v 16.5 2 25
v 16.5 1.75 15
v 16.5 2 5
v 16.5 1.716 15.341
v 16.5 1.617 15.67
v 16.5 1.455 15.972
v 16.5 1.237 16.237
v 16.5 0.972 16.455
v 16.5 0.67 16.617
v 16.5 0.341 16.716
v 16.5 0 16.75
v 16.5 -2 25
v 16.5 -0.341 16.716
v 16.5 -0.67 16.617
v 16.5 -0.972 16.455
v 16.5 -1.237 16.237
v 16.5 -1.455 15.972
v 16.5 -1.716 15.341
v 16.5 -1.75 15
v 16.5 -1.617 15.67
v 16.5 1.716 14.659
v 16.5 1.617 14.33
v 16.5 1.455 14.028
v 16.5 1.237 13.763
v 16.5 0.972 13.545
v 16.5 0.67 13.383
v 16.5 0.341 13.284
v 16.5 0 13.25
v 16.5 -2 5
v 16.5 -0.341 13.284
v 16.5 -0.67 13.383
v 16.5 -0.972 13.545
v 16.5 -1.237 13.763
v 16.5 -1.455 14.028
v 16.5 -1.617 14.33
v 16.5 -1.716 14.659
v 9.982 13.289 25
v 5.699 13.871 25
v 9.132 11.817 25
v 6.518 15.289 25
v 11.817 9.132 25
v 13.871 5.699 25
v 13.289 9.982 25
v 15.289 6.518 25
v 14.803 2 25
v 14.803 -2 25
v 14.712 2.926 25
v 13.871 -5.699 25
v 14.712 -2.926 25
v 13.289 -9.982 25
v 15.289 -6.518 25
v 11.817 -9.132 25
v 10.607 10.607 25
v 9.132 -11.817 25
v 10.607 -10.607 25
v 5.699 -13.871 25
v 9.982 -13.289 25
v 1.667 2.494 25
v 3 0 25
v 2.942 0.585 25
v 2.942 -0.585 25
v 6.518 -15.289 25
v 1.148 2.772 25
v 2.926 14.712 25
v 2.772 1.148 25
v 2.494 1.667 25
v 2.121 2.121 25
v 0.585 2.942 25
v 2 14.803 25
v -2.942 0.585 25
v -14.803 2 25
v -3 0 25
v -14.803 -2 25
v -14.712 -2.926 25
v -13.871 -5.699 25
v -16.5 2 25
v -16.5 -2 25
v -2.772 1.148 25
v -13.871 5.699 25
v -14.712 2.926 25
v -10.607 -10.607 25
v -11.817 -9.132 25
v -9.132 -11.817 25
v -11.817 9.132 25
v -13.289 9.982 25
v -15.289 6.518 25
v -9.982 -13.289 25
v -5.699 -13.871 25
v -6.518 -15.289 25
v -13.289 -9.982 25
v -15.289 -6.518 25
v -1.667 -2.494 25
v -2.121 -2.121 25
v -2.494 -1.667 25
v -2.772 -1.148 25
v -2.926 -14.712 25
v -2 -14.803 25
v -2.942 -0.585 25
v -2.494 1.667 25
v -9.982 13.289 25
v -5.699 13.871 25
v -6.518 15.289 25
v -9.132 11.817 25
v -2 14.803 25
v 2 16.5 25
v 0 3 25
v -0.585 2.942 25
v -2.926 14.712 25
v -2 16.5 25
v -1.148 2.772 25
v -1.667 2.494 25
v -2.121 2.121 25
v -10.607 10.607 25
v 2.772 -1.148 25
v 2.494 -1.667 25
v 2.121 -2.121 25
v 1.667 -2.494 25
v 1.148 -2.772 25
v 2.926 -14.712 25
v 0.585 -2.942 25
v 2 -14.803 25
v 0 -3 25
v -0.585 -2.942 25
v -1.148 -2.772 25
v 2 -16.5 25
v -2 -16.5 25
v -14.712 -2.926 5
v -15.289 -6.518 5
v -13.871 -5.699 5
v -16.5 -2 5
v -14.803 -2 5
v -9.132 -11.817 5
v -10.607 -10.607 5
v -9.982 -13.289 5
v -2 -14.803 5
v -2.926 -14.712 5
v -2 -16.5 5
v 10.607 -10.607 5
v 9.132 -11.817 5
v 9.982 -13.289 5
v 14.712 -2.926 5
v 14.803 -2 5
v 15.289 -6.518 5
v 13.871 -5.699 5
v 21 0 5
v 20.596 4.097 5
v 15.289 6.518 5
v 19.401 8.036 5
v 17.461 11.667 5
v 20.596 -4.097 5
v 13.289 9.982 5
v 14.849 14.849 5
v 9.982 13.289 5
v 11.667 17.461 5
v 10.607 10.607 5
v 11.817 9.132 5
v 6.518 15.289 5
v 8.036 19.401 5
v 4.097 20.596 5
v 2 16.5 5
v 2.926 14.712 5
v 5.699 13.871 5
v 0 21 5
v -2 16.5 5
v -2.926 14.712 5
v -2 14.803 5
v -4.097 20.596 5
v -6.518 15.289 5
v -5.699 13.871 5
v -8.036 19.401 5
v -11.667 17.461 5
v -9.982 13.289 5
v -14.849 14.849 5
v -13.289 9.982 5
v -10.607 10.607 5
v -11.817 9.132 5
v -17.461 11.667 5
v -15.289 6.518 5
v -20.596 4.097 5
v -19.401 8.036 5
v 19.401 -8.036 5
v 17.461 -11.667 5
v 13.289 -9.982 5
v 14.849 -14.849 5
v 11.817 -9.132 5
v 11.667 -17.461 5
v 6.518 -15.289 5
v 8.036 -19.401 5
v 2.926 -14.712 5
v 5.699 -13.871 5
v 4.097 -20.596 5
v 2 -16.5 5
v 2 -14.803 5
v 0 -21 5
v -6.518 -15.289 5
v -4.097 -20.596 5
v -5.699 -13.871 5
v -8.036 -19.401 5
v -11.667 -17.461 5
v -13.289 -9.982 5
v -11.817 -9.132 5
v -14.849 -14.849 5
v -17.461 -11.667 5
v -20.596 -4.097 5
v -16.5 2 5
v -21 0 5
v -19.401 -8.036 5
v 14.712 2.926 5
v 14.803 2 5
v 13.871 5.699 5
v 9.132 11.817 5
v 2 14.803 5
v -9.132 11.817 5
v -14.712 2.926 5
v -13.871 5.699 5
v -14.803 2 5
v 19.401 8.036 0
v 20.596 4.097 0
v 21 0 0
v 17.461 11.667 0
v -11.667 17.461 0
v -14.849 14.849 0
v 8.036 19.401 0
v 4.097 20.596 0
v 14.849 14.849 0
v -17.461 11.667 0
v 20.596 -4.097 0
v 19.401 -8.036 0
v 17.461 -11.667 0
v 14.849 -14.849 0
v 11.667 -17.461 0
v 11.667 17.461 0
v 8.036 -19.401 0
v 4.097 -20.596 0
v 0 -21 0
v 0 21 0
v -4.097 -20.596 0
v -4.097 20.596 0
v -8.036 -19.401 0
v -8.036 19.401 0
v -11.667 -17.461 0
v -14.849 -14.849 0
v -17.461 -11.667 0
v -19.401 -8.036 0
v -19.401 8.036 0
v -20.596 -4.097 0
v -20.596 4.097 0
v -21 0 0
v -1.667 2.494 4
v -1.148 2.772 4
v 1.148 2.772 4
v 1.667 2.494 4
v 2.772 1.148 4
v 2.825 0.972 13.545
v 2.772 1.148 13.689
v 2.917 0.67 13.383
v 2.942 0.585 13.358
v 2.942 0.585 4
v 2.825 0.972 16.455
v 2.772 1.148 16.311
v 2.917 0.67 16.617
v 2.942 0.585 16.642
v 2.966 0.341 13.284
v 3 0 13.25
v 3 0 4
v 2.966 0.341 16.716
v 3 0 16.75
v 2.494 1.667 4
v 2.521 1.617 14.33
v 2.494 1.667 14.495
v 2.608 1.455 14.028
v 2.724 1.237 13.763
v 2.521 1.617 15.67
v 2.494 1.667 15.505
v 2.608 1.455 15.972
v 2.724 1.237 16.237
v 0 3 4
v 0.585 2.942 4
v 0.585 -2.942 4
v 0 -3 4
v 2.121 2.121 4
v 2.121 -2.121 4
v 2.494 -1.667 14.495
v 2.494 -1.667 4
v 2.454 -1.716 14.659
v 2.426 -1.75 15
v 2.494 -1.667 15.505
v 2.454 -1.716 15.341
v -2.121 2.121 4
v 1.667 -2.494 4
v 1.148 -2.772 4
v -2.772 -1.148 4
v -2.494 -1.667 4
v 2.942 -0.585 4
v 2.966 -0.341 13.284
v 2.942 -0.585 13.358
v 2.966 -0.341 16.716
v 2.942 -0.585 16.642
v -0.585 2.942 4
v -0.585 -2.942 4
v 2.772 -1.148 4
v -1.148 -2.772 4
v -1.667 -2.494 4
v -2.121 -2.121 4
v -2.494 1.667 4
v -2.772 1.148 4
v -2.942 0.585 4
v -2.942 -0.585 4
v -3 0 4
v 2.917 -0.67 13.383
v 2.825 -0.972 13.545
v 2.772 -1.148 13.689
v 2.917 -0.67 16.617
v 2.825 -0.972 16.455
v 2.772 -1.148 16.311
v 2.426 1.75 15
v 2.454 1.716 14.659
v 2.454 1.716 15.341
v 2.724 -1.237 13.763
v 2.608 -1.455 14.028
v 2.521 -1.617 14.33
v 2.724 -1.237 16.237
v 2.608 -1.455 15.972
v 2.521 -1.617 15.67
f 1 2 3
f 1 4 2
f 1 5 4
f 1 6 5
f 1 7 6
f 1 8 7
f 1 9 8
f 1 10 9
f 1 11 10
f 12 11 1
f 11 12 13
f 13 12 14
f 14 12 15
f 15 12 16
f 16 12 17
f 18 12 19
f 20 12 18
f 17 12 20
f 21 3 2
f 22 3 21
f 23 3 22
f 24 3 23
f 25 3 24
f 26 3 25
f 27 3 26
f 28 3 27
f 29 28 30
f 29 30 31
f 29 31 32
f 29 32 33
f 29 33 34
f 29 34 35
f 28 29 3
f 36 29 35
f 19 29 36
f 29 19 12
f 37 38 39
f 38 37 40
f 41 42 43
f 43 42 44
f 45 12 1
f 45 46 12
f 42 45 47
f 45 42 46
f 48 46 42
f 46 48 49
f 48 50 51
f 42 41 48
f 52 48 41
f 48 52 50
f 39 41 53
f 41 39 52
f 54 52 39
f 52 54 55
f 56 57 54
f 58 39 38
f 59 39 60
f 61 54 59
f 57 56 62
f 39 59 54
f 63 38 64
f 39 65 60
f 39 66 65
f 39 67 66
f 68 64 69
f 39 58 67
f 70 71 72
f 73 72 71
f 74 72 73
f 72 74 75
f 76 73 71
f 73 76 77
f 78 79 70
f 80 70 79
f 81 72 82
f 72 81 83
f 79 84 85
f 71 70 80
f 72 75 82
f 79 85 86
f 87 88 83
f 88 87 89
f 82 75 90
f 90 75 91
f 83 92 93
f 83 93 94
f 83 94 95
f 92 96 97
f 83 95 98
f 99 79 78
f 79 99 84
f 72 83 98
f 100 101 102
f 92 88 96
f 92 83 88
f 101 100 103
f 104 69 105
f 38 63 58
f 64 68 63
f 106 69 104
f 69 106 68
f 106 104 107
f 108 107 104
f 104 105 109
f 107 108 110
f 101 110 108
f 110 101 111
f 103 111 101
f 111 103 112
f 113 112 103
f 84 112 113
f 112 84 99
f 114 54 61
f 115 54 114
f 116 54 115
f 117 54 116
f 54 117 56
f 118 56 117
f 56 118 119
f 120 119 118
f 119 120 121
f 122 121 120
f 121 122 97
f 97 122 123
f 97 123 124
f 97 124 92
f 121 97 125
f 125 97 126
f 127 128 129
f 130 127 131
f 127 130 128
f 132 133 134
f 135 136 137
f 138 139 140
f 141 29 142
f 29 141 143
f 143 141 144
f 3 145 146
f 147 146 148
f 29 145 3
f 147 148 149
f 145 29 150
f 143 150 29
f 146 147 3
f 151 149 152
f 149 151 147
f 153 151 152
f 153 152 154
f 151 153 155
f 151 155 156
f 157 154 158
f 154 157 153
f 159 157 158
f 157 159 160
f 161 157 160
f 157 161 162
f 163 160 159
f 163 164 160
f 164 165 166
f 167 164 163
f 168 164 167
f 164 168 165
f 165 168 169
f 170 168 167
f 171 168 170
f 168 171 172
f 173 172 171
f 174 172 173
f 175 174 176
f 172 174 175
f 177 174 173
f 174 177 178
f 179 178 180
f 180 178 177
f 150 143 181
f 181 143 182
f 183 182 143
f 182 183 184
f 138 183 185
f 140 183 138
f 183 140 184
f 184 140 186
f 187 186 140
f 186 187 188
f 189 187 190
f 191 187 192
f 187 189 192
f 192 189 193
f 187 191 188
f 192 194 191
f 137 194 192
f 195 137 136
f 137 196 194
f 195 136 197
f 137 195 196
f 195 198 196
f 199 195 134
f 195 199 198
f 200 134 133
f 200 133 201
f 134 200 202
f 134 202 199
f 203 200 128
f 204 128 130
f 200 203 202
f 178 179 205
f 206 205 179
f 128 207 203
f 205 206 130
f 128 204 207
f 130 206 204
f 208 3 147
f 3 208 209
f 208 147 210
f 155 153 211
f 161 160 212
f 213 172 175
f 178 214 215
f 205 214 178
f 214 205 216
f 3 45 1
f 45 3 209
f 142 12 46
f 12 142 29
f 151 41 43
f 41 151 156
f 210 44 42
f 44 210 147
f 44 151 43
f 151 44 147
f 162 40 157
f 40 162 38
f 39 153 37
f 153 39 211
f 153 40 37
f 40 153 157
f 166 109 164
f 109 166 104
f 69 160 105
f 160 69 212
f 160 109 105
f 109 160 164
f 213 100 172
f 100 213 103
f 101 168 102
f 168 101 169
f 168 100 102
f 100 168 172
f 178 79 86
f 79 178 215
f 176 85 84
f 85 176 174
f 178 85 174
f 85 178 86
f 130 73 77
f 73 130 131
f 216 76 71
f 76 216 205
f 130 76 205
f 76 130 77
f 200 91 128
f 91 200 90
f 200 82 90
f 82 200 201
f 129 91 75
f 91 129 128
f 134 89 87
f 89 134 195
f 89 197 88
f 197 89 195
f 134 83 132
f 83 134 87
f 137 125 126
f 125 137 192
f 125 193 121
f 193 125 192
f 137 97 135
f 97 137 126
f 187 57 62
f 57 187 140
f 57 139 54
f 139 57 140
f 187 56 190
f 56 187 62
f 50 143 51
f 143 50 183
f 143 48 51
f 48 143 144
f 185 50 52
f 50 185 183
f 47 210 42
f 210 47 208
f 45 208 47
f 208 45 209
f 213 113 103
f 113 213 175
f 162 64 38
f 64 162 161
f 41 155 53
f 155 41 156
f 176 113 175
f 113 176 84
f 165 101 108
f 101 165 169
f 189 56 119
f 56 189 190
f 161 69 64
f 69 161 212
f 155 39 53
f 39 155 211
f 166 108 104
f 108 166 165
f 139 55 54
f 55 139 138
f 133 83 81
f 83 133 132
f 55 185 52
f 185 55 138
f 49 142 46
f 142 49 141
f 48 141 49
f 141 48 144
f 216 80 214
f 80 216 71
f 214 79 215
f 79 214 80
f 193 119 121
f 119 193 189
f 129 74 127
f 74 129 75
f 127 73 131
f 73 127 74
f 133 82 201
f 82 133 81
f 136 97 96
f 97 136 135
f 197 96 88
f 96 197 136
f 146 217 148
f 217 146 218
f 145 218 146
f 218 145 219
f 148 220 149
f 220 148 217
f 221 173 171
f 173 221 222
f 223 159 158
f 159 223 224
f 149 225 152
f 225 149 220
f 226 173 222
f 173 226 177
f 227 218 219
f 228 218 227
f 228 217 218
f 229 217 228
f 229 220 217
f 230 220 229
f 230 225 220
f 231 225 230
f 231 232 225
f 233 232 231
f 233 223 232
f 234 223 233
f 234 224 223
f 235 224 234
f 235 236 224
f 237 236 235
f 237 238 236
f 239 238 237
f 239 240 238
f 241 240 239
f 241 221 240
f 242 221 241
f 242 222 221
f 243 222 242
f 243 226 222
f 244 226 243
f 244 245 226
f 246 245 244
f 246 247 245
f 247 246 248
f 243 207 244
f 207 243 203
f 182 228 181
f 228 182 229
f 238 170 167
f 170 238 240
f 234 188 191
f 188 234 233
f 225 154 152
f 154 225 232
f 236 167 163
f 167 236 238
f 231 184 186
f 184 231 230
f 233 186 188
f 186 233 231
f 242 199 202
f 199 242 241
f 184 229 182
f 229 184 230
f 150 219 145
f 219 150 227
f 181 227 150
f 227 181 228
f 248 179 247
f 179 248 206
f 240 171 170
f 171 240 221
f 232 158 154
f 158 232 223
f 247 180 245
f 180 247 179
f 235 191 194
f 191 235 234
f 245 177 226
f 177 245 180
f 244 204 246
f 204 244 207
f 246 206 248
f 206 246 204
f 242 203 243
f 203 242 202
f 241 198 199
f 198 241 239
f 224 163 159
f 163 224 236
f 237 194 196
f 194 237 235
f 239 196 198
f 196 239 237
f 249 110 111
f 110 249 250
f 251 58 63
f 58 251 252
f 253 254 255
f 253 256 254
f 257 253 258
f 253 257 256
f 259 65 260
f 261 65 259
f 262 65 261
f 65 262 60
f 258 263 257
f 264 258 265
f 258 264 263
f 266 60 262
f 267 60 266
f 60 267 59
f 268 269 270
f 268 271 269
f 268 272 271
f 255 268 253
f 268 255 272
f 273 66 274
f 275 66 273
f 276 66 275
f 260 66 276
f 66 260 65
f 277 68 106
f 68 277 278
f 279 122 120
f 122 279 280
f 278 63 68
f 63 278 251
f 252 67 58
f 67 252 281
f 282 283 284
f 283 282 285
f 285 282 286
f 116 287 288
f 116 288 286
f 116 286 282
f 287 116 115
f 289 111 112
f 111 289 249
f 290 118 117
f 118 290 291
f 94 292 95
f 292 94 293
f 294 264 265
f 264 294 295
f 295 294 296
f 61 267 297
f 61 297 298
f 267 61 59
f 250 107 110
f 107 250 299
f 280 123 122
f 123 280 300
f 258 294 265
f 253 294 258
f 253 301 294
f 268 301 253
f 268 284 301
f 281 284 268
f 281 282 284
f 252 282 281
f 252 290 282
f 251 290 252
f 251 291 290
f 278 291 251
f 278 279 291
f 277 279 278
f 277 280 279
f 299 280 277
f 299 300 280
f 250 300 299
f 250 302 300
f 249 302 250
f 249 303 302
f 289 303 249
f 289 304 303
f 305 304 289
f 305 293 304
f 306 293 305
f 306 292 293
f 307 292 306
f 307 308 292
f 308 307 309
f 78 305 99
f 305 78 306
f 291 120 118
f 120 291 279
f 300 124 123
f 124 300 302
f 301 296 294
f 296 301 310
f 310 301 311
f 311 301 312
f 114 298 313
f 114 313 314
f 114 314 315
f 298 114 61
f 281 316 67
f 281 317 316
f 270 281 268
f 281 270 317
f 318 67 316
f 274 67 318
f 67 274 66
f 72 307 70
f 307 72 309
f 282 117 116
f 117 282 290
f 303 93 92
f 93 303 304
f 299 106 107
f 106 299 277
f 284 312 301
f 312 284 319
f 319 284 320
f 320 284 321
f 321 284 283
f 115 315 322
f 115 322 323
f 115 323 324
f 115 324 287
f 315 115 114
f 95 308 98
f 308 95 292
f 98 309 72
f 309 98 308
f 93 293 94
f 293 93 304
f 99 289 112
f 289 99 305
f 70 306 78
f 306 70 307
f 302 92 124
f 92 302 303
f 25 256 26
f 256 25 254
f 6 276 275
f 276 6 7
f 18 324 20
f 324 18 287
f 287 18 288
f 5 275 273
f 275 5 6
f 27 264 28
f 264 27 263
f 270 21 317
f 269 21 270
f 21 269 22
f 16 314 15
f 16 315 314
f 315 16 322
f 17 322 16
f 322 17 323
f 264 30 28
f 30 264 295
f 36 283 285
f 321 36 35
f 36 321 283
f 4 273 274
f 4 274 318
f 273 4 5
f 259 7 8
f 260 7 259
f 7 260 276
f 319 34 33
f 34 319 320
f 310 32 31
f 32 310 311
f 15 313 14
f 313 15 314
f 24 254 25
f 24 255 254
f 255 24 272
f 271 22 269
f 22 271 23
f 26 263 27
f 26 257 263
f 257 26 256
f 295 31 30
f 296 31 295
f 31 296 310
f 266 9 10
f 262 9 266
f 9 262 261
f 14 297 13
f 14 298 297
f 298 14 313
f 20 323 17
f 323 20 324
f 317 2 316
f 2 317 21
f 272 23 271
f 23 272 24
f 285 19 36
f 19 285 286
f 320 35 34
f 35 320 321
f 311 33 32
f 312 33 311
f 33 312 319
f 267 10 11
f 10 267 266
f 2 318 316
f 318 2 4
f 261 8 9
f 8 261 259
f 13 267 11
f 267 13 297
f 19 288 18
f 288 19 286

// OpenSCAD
$fn = 32;

// ----------------------------------------------------------------------
// Control knob: skirt knob with grip ribs
// ----------------------------------------------------------------------

// --- parameters (mm) ---
skirt_d = 42;             // skirt diameter
skirt_t = 5;              // skirt thickness
rib_w = 4;                // grip rib width
rib_out = 2.5;            // grip rib radial protrusion
n_ribs = 12;              // number of grip ribs
knob_d = 30;              // knob body diameter
knob_h = 20;              // knob body height
bore_d = 6;               // shaft bore diameter
set_d = 3.5;              // set screw bore diameter
fit_tol = 0.1;            // tolerance for press fits, mm
free_tol = 0.3;           // tolerance for clearance fits, mm

rib_step = 360 / n_ribs;  // rib angular step
total_h = skirt_t + knob_h;  // overall height

difference() {
  union() {
    translate([0, 0, skirt_t]) cylinder(h = knob_h, d = knob_d);
    cylinder(h = skirt_t, d = skirt_d);
    for (i = [0 : n_ribs - 1])
      rotate([0, 0, i * rib_step])
        translate([knob_d / 2 - 1, -rib_w / 2, skirt_t])
          cube([rib_out, rib_w, knob_h]);
  }
  translate([0, 0, skirt_t - 1]) cylinder(h = knob_h + 2, d = bore_d);
  translate([-1, 0, skirt_t + knob_h / 2]) rotate([0, 90, 0])
    cylinder(h = knob_d / 2 + bore_d / 2 + 2, d = set_d);
}
